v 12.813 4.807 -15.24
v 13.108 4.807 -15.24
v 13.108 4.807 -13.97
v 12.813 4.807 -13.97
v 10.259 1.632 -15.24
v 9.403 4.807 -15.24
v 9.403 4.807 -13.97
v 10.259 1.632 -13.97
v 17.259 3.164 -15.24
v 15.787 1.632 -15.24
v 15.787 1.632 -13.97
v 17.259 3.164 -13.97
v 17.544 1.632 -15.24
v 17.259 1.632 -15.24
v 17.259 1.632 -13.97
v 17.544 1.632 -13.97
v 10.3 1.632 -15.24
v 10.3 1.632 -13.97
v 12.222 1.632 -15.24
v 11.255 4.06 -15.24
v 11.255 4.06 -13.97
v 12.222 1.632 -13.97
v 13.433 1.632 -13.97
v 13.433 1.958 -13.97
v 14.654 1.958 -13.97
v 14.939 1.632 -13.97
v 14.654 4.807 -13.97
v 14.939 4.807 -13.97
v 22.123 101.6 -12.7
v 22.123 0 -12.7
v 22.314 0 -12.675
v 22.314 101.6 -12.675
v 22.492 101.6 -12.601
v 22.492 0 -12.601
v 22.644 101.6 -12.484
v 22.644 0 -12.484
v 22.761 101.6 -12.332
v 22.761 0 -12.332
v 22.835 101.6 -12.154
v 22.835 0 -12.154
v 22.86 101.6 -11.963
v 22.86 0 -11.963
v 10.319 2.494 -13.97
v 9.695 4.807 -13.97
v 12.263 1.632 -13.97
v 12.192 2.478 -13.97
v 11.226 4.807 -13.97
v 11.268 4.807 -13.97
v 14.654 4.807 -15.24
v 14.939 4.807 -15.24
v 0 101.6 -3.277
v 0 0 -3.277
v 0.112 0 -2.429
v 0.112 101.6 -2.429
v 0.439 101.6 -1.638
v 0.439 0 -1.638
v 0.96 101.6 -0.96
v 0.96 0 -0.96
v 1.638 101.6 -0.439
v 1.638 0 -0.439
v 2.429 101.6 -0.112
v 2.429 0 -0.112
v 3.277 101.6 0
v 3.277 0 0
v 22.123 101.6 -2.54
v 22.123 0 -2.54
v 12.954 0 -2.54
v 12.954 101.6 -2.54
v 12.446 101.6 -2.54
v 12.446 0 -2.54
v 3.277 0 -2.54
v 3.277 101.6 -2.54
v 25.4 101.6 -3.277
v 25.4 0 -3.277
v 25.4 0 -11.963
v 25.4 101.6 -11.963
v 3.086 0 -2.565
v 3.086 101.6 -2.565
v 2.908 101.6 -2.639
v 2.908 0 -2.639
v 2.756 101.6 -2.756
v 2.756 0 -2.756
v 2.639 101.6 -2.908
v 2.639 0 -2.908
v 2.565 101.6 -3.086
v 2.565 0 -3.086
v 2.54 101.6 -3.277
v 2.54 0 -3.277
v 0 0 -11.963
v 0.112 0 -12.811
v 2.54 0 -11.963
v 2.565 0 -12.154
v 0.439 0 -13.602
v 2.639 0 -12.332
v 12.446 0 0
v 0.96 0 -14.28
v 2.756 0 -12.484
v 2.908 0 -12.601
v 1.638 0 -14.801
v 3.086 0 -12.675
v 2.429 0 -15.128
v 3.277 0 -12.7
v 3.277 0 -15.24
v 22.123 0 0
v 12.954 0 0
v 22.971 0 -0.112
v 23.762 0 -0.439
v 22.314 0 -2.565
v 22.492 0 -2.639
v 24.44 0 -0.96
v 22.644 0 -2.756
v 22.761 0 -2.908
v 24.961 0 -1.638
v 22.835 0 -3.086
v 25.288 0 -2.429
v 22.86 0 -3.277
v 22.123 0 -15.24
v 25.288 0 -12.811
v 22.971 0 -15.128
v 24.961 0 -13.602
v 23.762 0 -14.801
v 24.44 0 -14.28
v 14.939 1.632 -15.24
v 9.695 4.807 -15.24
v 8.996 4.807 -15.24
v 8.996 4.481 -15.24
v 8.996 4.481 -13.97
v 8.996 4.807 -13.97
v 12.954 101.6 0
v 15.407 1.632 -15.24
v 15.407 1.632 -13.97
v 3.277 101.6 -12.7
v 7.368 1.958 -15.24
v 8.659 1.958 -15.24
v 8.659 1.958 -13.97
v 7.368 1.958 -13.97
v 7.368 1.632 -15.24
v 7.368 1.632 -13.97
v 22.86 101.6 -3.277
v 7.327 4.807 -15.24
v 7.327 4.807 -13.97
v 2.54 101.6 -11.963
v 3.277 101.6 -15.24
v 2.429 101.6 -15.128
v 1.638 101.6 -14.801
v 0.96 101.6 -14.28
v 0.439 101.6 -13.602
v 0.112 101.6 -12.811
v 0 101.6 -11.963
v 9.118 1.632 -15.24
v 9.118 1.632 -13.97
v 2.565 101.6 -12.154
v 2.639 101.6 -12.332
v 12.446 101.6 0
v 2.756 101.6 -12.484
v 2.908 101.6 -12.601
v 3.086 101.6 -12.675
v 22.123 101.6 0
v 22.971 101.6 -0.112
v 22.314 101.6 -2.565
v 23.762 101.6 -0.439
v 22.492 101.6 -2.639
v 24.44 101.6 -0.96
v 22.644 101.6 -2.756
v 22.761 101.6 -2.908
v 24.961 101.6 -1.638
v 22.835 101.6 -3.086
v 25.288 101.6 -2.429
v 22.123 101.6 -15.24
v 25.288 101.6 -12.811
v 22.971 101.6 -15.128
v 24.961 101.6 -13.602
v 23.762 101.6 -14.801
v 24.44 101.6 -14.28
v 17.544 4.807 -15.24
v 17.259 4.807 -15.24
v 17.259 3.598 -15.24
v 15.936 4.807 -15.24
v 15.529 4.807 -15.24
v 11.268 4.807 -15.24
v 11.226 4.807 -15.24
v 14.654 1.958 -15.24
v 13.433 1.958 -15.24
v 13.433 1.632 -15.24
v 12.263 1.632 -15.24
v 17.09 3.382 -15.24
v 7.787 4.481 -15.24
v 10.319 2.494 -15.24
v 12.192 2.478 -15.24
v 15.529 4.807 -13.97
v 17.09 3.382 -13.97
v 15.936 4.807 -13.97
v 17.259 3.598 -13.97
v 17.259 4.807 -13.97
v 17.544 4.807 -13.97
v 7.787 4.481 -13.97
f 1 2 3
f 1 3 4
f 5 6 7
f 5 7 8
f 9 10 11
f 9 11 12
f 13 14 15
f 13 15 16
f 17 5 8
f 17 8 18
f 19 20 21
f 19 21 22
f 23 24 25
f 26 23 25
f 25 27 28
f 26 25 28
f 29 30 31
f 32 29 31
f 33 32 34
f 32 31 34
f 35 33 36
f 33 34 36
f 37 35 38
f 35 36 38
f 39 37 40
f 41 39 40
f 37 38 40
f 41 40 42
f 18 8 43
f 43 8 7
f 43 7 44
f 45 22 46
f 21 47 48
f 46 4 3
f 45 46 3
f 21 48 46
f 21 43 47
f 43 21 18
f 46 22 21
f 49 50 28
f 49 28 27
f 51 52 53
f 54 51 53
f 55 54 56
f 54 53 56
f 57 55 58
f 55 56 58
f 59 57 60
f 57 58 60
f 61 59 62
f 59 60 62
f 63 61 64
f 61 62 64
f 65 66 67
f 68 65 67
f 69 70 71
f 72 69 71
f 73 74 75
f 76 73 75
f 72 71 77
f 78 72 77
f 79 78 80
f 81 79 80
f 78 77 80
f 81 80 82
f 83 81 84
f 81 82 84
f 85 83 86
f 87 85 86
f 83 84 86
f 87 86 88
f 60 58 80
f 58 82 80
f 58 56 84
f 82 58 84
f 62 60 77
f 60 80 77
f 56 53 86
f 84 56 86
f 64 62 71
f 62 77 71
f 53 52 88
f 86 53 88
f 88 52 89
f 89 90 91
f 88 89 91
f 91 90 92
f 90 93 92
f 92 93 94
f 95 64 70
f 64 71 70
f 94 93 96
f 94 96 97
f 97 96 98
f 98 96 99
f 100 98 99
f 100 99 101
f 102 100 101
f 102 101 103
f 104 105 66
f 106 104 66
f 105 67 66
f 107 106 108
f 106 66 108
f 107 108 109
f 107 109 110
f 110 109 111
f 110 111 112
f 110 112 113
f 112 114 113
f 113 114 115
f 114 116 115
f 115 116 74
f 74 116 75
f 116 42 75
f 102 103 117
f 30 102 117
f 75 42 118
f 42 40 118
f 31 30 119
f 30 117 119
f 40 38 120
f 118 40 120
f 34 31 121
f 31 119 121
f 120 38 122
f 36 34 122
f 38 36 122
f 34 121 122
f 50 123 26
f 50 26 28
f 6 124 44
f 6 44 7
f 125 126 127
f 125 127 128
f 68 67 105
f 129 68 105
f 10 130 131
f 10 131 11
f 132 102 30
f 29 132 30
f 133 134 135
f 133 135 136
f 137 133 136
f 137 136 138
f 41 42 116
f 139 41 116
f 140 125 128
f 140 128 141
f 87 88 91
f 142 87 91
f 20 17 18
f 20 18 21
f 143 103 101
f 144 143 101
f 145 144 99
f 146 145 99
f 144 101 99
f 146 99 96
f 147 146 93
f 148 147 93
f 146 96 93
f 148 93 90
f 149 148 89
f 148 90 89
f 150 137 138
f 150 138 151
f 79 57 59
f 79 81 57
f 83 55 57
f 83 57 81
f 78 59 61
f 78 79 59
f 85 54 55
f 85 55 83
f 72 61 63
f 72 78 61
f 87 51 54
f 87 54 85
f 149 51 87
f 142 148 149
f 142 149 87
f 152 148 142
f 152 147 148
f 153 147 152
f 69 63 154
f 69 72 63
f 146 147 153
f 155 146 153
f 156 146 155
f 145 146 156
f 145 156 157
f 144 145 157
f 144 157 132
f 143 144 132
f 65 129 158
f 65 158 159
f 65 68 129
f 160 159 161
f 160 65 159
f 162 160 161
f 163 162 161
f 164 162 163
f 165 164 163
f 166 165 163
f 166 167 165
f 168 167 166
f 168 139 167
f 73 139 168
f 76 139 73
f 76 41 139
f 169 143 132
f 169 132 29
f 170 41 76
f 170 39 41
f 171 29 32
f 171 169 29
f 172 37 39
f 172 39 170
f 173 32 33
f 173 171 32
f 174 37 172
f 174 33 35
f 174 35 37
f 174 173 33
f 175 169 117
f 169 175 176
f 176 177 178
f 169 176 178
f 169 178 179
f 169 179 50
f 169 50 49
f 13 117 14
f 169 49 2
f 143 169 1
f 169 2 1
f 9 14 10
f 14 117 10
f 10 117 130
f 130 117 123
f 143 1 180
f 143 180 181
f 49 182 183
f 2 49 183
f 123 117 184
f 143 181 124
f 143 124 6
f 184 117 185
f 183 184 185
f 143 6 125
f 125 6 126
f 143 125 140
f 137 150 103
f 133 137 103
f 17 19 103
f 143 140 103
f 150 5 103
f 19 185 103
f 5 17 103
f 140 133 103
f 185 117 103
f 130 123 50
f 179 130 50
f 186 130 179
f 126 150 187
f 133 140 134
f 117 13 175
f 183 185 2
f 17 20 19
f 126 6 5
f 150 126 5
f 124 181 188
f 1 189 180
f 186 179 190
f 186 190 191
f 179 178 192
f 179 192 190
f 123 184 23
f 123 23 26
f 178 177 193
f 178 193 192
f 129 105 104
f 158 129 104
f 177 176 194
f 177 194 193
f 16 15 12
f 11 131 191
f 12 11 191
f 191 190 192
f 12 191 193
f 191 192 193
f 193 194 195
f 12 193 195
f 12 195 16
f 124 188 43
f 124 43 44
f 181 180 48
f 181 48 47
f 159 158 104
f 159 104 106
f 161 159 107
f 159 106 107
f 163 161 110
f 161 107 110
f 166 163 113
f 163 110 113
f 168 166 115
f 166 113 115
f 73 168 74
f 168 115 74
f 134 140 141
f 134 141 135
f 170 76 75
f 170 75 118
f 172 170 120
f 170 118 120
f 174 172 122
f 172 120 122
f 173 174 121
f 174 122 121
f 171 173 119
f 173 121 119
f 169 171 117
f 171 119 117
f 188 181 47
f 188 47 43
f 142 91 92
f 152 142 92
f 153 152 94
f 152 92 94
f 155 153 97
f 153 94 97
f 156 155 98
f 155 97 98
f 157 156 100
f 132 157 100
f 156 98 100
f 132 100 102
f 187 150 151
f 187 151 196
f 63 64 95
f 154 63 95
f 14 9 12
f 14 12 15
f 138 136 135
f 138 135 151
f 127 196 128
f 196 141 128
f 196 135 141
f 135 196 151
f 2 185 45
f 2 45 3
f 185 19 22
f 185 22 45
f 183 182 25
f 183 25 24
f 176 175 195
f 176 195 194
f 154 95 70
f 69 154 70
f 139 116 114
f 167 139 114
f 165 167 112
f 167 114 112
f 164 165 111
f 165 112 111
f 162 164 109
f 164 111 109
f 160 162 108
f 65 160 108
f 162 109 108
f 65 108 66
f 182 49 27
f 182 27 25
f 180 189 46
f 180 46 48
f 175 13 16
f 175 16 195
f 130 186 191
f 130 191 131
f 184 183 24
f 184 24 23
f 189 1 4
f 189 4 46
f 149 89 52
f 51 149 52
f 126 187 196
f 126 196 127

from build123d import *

# Parameters (mm, degrees)
BASE_FLANGE2_DEPTH = 101.6
CUT_EXTRUDE1_DEPTH = 1.27


# Sheet-metal steps are written as plain solids
with BuildPart() as part:
    # Sketch1 → Base-Flange2 (new body)
    with BuildSketch(Plane(origin=(0, 0, 0), x_dir=(1, 0, 0), z_dir=(0, 1, 0))):
        with BuildLine():
            Line((12.954, 0), (22.1234, 0))
            ThreePointArc((22.1234, 0), (24.440306079, 0.959693921), (25.4, 3.2766))
            Line((25.4, 3.2766), (25.4, 11.9634))
            ThreePointArc((25.4, 11.9634), (24.440306079, 14.280306079), (22.1234, 15.24))
            Line((22.1234, 15.24), (3.2766, 15.24))
            ThreePointArc((3.2766, 15.24), (0.959693921, 14.280306079), (0, 11.9634))
            Line((0, 11.9634), (0, 3.2766))
            ThreePointArc((0, 3.2766), (0.959693921, 0.959693921), (3.2766, 0))
            Line((3.2766, 0), (12.446, 0))
            Line((12.446, 0), (12.446, 2.54))
            Line((12.446, 2.54), (3.2766, 2.54))
            ThreePointArc((3.2766, 2.54), (2.755745145, 2.755745145), (2.54, 3.2766))
            Line((2.54, 3.2766), (2.54, 11.9634))
            ThreePointArc((2.54, 11.9634), (2.755745145, 12.484254855), (3.2766, 12.7))
            Line((3.2766, 12.7), (22.1234, 12.7))
            ThreePointArc((22.1234, 12.7), (22.644254855, 12.484254855), (22.86, 11.9634))
            Line((22.86, 11.9634), (22.86, 3.2766))
            ThreePointArc((22.86, 3.2766), (22.644254855, 2.755745145), (22.1234, 2.54))
            Line((22.1234, 2.54), (12.954, 2.54))
            Line((12.954, 2.54), (12.954, 0))
        make_face()
    extrude(amount=BASE_FLANGE2_DEPTH)

    # Sketch2 → Cut-Extrude1 (cut)
    with BuildSketch(Plane(origin=(0, 0, -15.24), x_dir=(-1, 0, 0), z_dir=(0, 0, -1))):
        Polygon((-17.544402312, 4.806950327), (-17.259466414, 4.806950327), (-17.259466414, 3.597880815), (-15.93591373, 4.806950327), (-15.529498466, 4.806950327), (-17.089649708, 3.38227084), (-15.407383081, 1.631950327), (-15.787085605, 1.631950327), (-17.259466414, 3.164116793), (-17.259466414, 1.631950327), (-17.544402312, 1.631950327), align=None)
        Polygon((-14.939274107, 4.806950327), (-14.654338209, 4.806950327), (-14.654338209, 1.957591352), (-13.433184363, 1.957591352), (-13.433184363, 1.631950327), (-14.939274107, 1.631950327), align=None)
        Polygon((-13.107543337, 4.806950327), (-12.813067176, 4.806950327), (-12.191677953, 2.47848979), (-11.267544339, 4.806950327), (-11.226203193, 4.806950327), (-10.319242055, 2.494390231), (-9.694672744, 4.806950327), (-9.403376671, 4.806950327), (-10.259456398, 1.631950327), (-10.300161526, 1.631950327), (-11.255460004, 4.060265631), (-12.222206799, 1.631950327), (-12.262911927, 1.631950327), align=None)
        Polygon((-8.996325389, 4.481309301), (-8.996325389, 4.806950327), (-7.327415132, 4.806950327), (-8.659236046, 1.957591352), (-7.36812026, 1.957591352), (-7.36812026, 1.631950327), (-9.118440773, 1.631950327), (-7.78661986, 4.481309301), align=None)
    extrude(amount=-CUT_EXTRUDE1_DEPTH, mode=Mode.SUBTRACT)


solid = part.part
